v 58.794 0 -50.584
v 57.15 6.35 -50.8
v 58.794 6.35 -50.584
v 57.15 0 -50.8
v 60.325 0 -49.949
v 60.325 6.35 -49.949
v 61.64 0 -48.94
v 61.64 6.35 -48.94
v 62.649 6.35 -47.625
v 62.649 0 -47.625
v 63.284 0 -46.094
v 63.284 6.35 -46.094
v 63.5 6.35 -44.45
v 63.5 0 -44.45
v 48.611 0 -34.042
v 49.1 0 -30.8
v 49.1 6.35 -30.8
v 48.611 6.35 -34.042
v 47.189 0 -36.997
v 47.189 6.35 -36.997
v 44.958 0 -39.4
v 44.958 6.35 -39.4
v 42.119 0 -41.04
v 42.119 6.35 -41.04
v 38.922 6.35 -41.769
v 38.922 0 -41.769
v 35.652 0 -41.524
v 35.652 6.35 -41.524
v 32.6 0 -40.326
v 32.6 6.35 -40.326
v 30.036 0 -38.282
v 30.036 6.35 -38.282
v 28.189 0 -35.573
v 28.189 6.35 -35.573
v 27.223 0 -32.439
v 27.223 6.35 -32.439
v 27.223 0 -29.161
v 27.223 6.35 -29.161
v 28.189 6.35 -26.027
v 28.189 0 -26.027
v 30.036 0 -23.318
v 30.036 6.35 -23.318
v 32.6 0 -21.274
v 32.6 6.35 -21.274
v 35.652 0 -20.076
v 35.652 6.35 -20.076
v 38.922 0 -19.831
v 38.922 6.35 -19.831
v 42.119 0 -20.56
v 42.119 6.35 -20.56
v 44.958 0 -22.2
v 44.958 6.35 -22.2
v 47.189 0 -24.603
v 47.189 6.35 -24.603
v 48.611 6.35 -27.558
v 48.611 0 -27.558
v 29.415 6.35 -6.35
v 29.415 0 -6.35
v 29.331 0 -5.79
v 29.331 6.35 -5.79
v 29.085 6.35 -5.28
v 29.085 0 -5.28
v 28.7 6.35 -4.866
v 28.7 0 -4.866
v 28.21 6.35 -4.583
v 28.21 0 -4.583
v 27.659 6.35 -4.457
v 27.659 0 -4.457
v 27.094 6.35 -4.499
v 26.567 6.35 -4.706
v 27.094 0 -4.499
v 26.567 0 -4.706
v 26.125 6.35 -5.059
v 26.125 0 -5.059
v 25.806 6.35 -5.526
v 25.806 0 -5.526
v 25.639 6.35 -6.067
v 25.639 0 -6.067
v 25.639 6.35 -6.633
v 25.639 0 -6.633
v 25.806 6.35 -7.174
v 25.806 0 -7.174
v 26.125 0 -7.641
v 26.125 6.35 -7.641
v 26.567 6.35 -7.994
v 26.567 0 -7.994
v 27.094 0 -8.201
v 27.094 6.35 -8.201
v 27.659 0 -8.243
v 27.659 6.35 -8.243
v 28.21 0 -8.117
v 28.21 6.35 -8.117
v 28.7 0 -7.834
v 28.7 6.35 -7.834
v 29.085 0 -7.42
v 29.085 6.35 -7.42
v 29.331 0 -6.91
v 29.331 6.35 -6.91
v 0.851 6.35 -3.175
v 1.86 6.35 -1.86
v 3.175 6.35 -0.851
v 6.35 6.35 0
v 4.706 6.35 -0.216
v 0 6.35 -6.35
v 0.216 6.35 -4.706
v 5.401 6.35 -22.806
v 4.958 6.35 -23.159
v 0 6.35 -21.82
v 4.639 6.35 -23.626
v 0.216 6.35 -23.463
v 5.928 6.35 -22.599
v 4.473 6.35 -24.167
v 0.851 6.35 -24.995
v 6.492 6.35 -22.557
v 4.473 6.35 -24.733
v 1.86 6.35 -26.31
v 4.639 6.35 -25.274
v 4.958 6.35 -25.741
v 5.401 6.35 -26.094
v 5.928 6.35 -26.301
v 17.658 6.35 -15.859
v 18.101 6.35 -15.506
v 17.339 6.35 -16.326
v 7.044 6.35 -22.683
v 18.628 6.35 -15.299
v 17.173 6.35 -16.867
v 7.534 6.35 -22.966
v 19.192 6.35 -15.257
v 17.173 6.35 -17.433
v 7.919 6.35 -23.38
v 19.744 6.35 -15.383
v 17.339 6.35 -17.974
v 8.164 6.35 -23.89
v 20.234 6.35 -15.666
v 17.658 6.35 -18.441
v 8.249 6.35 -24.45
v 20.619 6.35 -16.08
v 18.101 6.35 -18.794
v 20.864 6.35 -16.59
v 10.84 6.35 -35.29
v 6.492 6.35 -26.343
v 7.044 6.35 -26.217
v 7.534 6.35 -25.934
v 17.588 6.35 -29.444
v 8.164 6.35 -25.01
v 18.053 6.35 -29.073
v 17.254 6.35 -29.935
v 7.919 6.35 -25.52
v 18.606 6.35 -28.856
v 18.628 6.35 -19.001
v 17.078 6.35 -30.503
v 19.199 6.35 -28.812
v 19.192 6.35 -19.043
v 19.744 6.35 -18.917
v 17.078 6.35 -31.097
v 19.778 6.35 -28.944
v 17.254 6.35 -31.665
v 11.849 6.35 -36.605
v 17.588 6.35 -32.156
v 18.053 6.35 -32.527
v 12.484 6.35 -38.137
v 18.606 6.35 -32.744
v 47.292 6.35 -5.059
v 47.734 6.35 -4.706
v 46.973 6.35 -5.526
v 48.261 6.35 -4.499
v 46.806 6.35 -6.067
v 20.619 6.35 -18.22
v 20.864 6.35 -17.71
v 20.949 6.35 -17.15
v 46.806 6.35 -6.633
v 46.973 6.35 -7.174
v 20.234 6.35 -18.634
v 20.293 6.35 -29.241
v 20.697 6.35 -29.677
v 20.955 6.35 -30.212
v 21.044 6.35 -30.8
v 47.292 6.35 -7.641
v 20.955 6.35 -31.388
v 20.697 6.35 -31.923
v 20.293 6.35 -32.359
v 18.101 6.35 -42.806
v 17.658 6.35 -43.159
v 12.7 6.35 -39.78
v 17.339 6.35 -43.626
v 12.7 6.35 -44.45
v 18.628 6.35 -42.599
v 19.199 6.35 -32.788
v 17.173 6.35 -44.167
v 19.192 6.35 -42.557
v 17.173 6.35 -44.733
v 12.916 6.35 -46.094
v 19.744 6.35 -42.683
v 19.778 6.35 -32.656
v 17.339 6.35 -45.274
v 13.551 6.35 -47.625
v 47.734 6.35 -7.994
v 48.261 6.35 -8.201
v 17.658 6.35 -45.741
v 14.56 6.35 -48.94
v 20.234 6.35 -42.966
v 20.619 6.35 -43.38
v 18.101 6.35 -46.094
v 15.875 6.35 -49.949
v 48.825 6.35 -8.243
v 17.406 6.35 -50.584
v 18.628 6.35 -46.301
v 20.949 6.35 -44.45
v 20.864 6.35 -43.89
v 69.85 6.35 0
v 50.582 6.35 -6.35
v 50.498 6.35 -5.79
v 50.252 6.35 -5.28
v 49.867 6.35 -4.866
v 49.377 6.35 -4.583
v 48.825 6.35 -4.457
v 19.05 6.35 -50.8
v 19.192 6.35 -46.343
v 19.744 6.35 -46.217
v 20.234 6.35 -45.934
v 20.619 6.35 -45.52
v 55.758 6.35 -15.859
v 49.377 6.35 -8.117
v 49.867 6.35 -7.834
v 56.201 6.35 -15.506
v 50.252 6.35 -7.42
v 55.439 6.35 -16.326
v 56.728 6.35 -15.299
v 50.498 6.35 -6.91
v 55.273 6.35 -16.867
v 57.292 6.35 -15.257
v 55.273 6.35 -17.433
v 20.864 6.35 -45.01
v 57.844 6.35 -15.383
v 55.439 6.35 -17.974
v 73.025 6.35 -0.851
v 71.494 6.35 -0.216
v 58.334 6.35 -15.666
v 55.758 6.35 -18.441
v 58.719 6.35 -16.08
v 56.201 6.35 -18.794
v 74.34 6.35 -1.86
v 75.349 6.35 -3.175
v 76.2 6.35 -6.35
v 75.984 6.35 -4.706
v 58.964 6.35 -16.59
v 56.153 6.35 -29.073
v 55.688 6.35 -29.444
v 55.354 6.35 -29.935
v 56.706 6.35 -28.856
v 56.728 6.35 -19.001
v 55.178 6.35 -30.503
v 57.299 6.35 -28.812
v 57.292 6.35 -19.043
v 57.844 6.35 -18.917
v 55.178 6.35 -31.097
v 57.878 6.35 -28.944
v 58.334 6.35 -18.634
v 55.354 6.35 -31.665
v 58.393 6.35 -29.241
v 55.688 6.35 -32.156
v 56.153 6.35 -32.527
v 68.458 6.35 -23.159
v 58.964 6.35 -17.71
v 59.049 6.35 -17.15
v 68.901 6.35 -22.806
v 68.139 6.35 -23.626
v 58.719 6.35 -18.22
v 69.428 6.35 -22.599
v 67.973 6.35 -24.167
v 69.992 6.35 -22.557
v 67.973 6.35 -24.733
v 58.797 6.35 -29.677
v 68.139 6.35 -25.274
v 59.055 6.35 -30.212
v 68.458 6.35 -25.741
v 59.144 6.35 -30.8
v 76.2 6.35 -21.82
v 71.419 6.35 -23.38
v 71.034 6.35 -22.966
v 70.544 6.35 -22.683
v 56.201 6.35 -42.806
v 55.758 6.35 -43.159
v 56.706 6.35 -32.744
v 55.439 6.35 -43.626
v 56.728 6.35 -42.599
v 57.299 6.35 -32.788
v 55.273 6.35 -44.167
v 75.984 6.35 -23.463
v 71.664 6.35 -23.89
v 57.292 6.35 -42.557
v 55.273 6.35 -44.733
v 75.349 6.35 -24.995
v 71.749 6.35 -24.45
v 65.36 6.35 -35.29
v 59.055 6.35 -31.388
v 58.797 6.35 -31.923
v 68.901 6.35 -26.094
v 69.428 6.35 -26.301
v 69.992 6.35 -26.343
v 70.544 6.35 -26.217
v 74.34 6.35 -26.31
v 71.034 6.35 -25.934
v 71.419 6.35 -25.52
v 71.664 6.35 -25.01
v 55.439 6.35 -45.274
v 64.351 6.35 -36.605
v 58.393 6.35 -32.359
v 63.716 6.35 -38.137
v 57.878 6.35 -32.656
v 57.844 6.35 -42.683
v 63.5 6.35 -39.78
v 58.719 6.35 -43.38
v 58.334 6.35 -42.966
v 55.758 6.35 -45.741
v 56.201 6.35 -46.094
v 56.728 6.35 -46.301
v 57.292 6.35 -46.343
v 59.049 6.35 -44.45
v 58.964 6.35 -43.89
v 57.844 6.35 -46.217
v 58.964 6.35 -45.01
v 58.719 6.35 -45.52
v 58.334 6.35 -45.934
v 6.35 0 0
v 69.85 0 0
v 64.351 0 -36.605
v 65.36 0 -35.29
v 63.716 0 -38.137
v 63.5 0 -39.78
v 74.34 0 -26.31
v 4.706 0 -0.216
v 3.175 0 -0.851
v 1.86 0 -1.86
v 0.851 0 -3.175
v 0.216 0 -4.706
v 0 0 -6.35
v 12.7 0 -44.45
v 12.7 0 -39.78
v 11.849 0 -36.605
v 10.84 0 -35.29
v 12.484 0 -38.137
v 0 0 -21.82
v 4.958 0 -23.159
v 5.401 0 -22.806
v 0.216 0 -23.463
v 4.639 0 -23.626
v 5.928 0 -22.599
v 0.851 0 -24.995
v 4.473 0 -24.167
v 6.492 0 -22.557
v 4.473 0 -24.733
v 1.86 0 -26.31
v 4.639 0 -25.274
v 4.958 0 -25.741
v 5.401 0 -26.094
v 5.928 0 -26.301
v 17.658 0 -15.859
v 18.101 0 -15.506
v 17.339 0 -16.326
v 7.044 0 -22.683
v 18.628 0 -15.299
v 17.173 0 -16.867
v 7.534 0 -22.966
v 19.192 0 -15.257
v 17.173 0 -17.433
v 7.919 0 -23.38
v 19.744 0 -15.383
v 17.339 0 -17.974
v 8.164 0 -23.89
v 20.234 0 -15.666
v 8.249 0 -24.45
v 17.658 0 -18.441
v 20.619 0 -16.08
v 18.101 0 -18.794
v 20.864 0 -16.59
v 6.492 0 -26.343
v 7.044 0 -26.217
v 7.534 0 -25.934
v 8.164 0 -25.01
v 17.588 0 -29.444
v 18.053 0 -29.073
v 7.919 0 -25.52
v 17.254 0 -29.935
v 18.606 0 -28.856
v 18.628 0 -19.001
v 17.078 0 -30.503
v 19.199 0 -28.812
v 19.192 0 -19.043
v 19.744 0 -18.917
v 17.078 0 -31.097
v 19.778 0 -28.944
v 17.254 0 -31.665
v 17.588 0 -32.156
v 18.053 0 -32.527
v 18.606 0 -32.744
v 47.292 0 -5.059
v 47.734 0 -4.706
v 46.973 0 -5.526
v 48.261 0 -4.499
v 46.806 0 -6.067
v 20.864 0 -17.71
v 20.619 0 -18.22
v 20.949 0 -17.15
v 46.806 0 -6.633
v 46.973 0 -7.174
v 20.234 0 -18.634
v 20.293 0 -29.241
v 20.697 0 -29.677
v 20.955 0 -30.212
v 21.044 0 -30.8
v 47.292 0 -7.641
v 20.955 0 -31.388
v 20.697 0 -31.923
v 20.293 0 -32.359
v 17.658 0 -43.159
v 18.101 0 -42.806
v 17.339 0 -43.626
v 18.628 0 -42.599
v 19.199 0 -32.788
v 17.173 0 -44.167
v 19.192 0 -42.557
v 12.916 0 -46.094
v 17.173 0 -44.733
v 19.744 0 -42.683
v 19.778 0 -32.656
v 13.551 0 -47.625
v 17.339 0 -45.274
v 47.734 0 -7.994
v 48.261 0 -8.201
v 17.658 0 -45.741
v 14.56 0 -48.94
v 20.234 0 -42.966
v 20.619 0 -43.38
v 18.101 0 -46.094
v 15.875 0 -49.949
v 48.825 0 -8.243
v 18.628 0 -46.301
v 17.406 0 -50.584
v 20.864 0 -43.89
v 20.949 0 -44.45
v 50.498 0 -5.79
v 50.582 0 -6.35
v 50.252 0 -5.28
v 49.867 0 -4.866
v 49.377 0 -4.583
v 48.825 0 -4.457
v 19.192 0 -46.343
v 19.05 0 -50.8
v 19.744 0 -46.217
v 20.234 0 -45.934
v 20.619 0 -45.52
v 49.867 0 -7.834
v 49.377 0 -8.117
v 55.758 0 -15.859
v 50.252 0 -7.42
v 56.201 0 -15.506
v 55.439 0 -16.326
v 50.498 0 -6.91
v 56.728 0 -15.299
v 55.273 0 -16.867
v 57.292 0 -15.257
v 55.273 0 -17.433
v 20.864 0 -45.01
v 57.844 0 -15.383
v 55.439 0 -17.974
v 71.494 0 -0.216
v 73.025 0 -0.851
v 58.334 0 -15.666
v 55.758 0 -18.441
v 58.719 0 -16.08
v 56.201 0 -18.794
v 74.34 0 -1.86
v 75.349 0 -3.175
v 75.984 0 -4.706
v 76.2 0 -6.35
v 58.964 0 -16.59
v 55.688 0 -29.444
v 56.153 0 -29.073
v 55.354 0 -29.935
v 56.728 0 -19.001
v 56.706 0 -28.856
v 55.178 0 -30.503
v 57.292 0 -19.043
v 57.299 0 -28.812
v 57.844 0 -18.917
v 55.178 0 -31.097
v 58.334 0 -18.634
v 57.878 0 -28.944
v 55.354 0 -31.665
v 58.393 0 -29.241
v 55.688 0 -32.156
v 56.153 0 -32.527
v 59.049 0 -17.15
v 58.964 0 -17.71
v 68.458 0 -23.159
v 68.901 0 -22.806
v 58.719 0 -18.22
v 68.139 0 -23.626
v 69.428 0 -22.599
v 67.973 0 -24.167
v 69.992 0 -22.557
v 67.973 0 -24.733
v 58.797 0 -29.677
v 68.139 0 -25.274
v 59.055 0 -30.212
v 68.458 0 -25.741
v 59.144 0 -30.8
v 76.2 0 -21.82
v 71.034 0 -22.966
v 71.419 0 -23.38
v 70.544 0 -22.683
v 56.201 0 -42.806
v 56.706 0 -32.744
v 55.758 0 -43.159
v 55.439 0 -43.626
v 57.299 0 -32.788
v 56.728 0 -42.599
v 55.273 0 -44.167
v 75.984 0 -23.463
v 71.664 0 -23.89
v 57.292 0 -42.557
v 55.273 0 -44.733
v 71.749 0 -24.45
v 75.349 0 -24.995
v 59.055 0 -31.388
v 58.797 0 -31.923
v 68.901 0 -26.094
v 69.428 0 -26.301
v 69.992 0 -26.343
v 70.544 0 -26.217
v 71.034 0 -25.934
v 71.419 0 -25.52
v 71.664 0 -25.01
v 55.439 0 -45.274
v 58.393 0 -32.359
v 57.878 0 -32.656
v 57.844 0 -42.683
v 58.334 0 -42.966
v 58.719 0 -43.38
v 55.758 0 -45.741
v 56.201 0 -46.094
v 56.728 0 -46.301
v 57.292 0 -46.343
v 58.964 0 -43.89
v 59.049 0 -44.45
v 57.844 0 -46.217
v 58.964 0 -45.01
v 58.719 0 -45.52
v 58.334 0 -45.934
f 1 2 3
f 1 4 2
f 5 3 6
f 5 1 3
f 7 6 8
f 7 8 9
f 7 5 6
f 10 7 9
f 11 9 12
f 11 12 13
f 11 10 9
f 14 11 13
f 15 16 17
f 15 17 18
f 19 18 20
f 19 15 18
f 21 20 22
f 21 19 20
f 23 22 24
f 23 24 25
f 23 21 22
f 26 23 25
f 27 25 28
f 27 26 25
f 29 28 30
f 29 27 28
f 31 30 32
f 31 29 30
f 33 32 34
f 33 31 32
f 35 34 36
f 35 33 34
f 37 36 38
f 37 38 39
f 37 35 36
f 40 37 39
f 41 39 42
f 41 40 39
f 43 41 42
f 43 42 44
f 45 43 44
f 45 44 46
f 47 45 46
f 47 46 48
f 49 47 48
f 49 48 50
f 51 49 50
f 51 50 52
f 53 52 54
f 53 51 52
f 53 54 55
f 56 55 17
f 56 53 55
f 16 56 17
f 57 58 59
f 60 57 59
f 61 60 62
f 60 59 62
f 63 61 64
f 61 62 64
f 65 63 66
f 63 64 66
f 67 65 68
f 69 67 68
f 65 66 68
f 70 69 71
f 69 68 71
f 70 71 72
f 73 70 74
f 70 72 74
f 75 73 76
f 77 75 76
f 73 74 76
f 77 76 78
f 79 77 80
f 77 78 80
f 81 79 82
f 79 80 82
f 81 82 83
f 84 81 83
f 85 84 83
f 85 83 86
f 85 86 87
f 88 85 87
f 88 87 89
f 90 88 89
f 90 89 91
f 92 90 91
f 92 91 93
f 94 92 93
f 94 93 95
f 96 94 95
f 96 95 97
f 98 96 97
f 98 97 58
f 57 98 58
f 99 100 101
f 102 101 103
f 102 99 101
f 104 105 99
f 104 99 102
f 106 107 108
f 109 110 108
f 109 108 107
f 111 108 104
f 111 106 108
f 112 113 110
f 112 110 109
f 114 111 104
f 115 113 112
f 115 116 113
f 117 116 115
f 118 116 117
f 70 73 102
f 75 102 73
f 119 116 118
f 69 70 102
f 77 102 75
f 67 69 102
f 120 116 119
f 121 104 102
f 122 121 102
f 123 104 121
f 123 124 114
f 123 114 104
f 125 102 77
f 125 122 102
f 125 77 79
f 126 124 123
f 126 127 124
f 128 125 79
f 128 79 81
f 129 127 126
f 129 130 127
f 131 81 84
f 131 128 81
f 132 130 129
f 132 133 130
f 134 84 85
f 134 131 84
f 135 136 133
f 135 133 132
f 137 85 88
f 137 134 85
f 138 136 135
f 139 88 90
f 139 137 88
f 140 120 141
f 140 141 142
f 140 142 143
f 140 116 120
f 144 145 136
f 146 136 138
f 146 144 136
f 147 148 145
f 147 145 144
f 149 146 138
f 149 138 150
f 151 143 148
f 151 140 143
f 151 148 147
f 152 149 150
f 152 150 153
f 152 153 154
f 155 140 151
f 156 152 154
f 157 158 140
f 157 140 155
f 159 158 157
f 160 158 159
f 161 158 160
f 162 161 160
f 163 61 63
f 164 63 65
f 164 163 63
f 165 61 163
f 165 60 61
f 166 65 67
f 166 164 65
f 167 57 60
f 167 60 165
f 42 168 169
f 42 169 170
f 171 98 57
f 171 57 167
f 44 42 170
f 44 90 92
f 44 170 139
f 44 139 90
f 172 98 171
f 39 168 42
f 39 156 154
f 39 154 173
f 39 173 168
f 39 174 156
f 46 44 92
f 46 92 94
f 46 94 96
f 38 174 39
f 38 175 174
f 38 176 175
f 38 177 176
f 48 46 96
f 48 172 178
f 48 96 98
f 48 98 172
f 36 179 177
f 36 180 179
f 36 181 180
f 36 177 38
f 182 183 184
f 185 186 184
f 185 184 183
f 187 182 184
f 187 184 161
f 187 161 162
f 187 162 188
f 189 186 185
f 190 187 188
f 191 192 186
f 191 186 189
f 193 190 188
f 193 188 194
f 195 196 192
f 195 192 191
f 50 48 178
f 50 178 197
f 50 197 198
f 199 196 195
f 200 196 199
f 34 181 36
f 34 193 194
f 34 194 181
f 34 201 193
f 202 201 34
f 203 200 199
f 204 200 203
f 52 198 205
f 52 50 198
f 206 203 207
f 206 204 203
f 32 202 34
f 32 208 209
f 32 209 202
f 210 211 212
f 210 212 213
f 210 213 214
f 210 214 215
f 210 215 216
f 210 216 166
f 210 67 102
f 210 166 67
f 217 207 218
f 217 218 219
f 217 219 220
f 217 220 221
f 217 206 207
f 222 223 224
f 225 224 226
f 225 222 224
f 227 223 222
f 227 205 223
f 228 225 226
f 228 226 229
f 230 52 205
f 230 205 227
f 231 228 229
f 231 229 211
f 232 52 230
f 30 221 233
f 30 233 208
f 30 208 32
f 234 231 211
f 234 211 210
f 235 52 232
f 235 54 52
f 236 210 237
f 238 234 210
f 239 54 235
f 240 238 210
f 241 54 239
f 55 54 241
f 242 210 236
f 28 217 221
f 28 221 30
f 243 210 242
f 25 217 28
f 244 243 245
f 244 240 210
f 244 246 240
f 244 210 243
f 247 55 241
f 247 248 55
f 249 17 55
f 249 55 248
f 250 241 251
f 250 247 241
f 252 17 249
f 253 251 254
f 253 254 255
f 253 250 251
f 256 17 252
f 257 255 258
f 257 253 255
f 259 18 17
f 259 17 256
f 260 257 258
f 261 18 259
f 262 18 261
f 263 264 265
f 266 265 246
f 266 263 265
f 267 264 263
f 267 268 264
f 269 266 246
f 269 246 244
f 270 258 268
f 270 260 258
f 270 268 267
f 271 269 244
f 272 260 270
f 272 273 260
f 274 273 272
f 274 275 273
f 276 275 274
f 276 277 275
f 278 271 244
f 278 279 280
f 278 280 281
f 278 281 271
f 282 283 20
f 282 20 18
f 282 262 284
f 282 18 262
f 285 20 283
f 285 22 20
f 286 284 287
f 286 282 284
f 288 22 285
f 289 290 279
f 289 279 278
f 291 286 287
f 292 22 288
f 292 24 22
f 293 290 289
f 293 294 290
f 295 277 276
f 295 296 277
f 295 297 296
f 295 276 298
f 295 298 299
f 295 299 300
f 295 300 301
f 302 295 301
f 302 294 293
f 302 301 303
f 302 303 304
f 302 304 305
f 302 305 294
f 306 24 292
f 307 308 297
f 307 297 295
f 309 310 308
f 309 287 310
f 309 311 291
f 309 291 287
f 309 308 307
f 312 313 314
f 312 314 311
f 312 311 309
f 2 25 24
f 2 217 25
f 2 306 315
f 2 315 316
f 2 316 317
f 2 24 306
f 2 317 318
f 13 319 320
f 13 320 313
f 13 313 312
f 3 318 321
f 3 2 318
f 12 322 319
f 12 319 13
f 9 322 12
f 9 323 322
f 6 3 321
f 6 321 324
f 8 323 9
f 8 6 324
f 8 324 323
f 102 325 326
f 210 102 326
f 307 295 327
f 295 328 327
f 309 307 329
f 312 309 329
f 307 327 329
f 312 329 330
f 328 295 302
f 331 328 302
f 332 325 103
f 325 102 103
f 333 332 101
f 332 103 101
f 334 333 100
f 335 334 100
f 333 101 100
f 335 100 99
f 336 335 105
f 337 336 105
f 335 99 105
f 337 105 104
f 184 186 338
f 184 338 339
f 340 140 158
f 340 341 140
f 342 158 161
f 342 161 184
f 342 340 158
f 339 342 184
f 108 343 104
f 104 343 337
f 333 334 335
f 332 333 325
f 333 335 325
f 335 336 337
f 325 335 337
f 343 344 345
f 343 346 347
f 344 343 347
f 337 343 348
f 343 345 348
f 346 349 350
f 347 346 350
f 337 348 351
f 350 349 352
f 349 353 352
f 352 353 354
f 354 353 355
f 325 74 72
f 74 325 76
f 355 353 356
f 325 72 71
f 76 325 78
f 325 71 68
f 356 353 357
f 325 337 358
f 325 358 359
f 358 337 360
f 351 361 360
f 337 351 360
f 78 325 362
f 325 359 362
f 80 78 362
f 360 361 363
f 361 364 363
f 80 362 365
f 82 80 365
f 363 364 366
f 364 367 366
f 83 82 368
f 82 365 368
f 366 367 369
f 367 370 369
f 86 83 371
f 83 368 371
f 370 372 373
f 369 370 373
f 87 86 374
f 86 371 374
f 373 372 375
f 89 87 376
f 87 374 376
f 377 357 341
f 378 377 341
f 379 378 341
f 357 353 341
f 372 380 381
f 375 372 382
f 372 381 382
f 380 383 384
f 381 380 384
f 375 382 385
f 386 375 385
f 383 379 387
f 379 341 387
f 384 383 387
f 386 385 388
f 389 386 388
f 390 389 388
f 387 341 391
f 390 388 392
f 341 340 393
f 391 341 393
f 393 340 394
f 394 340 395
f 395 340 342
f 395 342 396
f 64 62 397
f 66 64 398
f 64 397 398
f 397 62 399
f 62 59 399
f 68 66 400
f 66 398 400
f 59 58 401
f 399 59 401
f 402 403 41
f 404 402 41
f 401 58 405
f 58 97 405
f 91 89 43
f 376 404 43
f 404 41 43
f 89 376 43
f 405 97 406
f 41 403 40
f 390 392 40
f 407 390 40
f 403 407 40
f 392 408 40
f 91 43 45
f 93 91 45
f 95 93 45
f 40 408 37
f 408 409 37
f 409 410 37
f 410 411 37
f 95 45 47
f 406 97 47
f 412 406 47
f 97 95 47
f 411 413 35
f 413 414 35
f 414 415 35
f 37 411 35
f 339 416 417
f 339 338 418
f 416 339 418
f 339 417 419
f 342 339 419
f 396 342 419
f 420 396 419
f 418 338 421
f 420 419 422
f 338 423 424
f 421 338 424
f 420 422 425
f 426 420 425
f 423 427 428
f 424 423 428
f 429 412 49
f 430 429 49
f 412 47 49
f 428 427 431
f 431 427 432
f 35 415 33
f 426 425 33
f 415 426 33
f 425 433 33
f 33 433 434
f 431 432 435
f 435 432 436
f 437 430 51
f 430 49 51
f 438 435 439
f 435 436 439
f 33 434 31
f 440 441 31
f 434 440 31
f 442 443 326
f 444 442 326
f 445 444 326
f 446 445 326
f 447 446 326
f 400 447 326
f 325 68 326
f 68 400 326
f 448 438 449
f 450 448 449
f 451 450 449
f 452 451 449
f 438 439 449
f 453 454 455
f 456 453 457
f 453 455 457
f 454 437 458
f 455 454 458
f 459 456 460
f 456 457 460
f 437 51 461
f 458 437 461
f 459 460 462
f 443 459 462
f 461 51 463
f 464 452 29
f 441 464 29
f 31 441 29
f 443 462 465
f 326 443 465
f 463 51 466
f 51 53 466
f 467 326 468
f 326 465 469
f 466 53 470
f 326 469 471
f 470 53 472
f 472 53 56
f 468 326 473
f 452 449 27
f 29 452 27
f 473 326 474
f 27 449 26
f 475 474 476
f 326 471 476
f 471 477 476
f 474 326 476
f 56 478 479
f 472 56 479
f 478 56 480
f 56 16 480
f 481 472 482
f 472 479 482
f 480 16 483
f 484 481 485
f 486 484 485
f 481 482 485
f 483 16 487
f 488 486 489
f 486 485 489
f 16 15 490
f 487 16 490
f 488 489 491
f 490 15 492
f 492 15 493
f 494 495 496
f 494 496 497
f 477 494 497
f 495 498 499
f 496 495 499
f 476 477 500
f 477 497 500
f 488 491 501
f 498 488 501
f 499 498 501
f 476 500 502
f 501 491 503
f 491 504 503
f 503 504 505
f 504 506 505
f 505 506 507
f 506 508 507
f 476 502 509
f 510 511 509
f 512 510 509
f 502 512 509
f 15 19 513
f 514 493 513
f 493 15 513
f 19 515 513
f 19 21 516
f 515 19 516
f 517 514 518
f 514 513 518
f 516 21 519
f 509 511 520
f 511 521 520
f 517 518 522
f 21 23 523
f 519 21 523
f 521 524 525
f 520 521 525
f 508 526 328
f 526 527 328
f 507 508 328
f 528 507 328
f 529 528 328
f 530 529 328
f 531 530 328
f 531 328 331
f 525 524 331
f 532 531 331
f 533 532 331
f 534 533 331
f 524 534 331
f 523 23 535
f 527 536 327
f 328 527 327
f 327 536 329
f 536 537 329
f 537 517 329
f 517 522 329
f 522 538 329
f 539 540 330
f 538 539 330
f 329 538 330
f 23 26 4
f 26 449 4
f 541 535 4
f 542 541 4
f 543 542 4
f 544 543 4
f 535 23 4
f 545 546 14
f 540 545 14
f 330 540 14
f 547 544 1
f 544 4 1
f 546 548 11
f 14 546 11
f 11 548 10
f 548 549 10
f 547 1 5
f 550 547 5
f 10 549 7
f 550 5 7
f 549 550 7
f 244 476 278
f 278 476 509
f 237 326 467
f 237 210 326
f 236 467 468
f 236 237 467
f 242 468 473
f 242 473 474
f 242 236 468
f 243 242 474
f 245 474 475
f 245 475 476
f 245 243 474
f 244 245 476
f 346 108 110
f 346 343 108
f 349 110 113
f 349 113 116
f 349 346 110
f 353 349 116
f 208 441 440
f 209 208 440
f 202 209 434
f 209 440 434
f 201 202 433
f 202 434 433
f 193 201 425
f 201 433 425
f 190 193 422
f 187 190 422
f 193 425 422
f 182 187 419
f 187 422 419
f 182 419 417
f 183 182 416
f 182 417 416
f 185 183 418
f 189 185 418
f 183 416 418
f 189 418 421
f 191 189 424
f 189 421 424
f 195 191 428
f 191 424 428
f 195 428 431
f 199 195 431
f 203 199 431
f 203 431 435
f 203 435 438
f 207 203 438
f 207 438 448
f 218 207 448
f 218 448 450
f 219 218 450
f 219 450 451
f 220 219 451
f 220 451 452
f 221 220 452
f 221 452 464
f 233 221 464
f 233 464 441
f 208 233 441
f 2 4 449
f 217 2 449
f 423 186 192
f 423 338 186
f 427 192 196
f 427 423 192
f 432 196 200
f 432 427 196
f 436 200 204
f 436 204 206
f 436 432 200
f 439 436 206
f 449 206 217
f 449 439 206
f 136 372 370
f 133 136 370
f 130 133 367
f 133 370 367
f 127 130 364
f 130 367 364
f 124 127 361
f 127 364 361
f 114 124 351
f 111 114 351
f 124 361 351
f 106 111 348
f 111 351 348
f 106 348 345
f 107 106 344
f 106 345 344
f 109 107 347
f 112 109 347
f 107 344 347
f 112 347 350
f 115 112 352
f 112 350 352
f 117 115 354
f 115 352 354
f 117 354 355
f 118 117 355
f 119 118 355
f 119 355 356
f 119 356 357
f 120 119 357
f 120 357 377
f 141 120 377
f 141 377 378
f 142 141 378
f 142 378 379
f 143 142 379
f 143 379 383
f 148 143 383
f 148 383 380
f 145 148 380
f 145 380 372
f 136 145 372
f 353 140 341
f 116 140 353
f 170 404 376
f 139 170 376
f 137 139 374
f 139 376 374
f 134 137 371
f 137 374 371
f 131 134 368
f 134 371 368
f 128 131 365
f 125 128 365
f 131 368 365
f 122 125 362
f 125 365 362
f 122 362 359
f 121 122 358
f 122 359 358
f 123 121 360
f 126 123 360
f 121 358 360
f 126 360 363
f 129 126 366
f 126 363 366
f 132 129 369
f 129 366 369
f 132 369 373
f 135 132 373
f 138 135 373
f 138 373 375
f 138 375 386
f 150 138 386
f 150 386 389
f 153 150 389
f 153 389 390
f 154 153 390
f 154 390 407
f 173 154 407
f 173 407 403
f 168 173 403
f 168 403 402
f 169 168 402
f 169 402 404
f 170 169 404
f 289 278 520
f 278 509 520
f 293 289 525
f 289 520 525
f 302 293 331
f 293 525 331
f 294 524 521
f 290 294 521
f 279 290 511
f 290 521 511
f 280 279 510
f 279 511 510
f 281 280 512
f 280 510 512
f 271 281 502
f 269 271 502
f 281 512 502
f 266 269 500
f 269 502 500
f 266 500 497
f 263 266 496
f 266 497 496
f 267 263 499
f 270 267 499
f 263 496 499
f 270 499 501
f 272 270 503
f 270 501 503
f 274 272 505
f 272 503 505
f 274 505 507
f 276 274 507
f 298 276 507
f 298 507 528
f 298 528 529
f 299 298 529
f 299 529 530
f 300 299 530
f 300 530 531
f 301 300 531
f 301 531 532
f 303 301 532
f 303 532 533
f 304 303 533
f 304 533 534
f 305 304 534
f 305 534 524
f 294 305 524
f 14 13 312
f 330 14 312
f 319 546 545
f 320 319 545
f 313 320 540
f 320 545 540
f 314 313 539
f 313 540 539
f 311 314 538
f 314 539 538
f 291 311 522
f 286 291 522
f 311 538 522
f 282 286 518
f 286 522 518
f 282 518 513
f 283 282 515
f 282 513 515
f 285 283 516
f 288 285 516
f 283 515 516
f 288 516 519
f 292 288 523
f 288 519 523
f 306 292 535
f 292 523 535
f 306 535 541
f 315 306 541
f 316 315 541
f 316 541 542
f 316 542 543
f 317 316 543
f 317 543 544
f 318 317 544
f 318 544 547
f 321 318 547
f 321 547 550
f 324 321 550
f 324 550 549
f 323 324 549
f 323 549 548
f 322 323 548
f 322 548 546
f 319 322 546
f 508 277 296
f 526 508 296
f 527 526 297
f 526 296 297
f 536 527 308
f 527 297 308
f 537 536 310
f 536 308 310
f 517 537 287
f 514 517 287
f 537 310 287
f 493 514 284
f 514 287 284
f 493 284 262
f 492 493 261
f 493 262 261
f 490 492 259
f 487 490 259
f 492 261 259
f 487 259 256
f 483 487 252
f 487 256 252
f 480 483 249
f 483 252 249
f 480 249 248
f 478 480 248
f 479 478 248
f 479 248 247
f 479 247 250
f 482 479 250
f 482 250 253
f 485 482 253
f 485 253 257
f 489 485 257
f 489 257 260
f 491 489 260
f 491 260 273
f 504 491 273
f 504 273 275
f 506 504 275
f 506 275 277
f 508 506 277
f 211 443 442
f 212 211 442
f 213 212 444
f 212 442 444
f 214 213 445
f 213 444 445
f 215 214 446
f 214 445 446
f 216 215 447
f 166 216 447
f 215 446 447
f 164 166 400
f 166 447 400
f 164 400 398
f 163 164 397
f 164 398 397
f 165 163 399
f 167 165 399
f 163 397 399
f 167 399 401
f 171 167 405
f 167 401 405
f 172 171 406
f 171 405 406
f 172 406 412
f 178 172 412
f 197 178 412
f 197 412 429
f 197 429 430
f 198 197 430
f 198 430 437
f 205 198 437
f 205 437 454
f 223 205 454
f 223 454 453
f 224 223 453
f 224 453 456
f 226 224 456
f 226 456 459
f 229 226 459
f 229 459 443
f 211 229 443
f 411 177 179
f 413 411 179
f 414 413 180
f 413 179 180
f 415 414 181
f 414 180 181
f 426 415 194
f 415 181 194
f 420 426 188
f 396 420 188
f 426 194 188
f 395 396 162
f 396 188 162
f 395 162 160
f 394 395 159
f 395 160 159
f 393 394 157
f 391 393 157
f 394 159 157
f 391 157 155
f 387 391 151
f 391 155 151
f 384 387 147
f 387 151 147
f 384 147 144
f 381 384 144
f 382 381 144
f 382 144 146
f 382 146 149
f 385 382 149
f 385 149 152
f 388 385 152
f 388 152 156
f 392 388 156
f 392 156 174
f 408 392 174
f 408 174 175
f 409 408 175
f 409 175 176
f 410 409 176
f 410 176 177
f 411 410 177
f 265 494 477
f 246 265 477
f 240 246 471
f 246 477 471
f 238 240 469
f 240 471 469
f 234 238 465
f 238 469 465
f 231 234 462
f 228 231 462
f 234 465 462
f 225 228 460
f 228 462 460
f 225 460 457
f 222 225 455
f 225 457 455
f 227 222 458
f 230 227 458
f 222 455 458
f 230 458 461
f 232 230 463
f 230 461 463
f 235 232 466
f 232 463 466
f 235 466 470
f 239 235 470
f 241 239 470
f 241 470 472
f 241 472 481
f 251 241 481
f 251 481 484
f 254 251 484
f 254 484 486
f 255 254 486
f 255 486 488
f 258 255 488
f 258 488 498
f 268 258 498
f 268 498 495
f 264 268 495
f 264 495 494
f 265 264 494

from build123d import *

# Parameters (mm, degrees)
SKETCH1_R           = 11
BOSS_EXTRUDE1_DEPTH = 6.35
SKETCH2_R           = 1.9939
CUT_EXTRUDE1_DEPTH  = 7.35
SKETCH14_R          = 1.89865
M3_TAP_DEPTH        = 7.35
SKETCH15_R          = 1.89865
M5_THROUGH_DEPTH    = 7.35
CUT_EXTRUDE2_DEPTH  = 7.35
FILLET2_R           = 6.35


with BuildPart() as part:
    # Sketch1 → Boss-Extrude1 (new body)
    with BuildSketch(Plane(origin=(0, 0, 0), x_dir=(1, 0, 0), z_dir=(0, 1, 0))):
        Polygon((0, 0), (76.2, 0), (76.2, 50.8), (38.1, 50.8), (0, 50.8), align=None)
        with Locations((38.1, 30.8)):
            Circle(SKETCH1_R, mode=Mode.SUBTRACT)
    extrude(amount=BOSS_EXTRUDE1_DEPTH)

    # Sketch2 → Cut-Extrude1 (cut, through all)
    with BuildSketch(Plane(origin=(0, 6.35, 0), x_dir=(1, 0, 0), z_dir=(0, 1, 0))):
        with Locations((19.05, 30.8)):
            Circle(SKETCH2_R)
        with Locations((57.15, 30.8)):
            Circle(SKETCH2_R)
    extrude(amount=-CUT_EXTRUDE1_DEPTH, mode=Mode.SUBTRACT)

    # Sketch14 → M3-tap (cut, through all)
    with BuildSketch(Plane.XZ):
        with Locations((57.15, -44.45)):
            Circle(SKETCH14_R)
        with Locations((19.05, -44.45)):
            Circle(SKETCH14_R)
        with Locations((19.05, -17.15)):
            Circle(SKETCH14_R)
        with Locations((57.15, -17.15)):
            Circle(SKETCH14_R)
    extrude(amount=-M3_TAP_DEPTH, mode=Mode.SUBTRACT)

    # Sketch15 → M5-through (cut, through all)
    with BuildSketch(Plane.XZ):
        with Locations((69.85, -24.45004)):
            Circle(SKETCH15_R)
        with Locations((48.683333333, -6.35)):
            Circle(SKETCH15_R)
        with Locations((27.516666667, -6.35)):
            Circle(SKETCH15_R)
        with Locations((6.35, -24.45004)):
            Circle(SKETCH15_R)
    extrude(amount=-M5_THROUGH_DEPTH, mode=Mode.SUBTRACT)

    # Sketch12 → Cut-Extrude2 (cut, through all)
    with BuildSketch(Plane(origin=(0, 6.35, 0), x_dir=(1, 0, 0), z_dir=(0, 1, 0))):
        Polygon((0, 50.8), (12.7, 50.8), (12.7, 37.15), (0, 24.45), align=None)
        Polygon((63.5, 50.8), (63.5, 37.15), (76.2, 24.45), (76.2, 50.8), align=None)
    extrude(amount=-CUT_EXTRUDE2_DEPTH, mode=Mode.SUBTRACT)

    # Fillet2
    fillet2_edges = [part.edges().sort_by_distance(p)[0] for p in [
        (0, 3.175, -24.45),
        (12.7, 3.175, -50.8),
        (12.7, 3.175, -37.15),
        (63.5, 3.175, -50.8),
        (76.2, 3.175, -24.45),
        (63.5, 3.175, -37.15),
        (76.2, 3.175, 0),
        (0, 3.175, 0),
    ]]
    fillet(fillet2_edges, radius=FILLET2_R)


solid = part.part
